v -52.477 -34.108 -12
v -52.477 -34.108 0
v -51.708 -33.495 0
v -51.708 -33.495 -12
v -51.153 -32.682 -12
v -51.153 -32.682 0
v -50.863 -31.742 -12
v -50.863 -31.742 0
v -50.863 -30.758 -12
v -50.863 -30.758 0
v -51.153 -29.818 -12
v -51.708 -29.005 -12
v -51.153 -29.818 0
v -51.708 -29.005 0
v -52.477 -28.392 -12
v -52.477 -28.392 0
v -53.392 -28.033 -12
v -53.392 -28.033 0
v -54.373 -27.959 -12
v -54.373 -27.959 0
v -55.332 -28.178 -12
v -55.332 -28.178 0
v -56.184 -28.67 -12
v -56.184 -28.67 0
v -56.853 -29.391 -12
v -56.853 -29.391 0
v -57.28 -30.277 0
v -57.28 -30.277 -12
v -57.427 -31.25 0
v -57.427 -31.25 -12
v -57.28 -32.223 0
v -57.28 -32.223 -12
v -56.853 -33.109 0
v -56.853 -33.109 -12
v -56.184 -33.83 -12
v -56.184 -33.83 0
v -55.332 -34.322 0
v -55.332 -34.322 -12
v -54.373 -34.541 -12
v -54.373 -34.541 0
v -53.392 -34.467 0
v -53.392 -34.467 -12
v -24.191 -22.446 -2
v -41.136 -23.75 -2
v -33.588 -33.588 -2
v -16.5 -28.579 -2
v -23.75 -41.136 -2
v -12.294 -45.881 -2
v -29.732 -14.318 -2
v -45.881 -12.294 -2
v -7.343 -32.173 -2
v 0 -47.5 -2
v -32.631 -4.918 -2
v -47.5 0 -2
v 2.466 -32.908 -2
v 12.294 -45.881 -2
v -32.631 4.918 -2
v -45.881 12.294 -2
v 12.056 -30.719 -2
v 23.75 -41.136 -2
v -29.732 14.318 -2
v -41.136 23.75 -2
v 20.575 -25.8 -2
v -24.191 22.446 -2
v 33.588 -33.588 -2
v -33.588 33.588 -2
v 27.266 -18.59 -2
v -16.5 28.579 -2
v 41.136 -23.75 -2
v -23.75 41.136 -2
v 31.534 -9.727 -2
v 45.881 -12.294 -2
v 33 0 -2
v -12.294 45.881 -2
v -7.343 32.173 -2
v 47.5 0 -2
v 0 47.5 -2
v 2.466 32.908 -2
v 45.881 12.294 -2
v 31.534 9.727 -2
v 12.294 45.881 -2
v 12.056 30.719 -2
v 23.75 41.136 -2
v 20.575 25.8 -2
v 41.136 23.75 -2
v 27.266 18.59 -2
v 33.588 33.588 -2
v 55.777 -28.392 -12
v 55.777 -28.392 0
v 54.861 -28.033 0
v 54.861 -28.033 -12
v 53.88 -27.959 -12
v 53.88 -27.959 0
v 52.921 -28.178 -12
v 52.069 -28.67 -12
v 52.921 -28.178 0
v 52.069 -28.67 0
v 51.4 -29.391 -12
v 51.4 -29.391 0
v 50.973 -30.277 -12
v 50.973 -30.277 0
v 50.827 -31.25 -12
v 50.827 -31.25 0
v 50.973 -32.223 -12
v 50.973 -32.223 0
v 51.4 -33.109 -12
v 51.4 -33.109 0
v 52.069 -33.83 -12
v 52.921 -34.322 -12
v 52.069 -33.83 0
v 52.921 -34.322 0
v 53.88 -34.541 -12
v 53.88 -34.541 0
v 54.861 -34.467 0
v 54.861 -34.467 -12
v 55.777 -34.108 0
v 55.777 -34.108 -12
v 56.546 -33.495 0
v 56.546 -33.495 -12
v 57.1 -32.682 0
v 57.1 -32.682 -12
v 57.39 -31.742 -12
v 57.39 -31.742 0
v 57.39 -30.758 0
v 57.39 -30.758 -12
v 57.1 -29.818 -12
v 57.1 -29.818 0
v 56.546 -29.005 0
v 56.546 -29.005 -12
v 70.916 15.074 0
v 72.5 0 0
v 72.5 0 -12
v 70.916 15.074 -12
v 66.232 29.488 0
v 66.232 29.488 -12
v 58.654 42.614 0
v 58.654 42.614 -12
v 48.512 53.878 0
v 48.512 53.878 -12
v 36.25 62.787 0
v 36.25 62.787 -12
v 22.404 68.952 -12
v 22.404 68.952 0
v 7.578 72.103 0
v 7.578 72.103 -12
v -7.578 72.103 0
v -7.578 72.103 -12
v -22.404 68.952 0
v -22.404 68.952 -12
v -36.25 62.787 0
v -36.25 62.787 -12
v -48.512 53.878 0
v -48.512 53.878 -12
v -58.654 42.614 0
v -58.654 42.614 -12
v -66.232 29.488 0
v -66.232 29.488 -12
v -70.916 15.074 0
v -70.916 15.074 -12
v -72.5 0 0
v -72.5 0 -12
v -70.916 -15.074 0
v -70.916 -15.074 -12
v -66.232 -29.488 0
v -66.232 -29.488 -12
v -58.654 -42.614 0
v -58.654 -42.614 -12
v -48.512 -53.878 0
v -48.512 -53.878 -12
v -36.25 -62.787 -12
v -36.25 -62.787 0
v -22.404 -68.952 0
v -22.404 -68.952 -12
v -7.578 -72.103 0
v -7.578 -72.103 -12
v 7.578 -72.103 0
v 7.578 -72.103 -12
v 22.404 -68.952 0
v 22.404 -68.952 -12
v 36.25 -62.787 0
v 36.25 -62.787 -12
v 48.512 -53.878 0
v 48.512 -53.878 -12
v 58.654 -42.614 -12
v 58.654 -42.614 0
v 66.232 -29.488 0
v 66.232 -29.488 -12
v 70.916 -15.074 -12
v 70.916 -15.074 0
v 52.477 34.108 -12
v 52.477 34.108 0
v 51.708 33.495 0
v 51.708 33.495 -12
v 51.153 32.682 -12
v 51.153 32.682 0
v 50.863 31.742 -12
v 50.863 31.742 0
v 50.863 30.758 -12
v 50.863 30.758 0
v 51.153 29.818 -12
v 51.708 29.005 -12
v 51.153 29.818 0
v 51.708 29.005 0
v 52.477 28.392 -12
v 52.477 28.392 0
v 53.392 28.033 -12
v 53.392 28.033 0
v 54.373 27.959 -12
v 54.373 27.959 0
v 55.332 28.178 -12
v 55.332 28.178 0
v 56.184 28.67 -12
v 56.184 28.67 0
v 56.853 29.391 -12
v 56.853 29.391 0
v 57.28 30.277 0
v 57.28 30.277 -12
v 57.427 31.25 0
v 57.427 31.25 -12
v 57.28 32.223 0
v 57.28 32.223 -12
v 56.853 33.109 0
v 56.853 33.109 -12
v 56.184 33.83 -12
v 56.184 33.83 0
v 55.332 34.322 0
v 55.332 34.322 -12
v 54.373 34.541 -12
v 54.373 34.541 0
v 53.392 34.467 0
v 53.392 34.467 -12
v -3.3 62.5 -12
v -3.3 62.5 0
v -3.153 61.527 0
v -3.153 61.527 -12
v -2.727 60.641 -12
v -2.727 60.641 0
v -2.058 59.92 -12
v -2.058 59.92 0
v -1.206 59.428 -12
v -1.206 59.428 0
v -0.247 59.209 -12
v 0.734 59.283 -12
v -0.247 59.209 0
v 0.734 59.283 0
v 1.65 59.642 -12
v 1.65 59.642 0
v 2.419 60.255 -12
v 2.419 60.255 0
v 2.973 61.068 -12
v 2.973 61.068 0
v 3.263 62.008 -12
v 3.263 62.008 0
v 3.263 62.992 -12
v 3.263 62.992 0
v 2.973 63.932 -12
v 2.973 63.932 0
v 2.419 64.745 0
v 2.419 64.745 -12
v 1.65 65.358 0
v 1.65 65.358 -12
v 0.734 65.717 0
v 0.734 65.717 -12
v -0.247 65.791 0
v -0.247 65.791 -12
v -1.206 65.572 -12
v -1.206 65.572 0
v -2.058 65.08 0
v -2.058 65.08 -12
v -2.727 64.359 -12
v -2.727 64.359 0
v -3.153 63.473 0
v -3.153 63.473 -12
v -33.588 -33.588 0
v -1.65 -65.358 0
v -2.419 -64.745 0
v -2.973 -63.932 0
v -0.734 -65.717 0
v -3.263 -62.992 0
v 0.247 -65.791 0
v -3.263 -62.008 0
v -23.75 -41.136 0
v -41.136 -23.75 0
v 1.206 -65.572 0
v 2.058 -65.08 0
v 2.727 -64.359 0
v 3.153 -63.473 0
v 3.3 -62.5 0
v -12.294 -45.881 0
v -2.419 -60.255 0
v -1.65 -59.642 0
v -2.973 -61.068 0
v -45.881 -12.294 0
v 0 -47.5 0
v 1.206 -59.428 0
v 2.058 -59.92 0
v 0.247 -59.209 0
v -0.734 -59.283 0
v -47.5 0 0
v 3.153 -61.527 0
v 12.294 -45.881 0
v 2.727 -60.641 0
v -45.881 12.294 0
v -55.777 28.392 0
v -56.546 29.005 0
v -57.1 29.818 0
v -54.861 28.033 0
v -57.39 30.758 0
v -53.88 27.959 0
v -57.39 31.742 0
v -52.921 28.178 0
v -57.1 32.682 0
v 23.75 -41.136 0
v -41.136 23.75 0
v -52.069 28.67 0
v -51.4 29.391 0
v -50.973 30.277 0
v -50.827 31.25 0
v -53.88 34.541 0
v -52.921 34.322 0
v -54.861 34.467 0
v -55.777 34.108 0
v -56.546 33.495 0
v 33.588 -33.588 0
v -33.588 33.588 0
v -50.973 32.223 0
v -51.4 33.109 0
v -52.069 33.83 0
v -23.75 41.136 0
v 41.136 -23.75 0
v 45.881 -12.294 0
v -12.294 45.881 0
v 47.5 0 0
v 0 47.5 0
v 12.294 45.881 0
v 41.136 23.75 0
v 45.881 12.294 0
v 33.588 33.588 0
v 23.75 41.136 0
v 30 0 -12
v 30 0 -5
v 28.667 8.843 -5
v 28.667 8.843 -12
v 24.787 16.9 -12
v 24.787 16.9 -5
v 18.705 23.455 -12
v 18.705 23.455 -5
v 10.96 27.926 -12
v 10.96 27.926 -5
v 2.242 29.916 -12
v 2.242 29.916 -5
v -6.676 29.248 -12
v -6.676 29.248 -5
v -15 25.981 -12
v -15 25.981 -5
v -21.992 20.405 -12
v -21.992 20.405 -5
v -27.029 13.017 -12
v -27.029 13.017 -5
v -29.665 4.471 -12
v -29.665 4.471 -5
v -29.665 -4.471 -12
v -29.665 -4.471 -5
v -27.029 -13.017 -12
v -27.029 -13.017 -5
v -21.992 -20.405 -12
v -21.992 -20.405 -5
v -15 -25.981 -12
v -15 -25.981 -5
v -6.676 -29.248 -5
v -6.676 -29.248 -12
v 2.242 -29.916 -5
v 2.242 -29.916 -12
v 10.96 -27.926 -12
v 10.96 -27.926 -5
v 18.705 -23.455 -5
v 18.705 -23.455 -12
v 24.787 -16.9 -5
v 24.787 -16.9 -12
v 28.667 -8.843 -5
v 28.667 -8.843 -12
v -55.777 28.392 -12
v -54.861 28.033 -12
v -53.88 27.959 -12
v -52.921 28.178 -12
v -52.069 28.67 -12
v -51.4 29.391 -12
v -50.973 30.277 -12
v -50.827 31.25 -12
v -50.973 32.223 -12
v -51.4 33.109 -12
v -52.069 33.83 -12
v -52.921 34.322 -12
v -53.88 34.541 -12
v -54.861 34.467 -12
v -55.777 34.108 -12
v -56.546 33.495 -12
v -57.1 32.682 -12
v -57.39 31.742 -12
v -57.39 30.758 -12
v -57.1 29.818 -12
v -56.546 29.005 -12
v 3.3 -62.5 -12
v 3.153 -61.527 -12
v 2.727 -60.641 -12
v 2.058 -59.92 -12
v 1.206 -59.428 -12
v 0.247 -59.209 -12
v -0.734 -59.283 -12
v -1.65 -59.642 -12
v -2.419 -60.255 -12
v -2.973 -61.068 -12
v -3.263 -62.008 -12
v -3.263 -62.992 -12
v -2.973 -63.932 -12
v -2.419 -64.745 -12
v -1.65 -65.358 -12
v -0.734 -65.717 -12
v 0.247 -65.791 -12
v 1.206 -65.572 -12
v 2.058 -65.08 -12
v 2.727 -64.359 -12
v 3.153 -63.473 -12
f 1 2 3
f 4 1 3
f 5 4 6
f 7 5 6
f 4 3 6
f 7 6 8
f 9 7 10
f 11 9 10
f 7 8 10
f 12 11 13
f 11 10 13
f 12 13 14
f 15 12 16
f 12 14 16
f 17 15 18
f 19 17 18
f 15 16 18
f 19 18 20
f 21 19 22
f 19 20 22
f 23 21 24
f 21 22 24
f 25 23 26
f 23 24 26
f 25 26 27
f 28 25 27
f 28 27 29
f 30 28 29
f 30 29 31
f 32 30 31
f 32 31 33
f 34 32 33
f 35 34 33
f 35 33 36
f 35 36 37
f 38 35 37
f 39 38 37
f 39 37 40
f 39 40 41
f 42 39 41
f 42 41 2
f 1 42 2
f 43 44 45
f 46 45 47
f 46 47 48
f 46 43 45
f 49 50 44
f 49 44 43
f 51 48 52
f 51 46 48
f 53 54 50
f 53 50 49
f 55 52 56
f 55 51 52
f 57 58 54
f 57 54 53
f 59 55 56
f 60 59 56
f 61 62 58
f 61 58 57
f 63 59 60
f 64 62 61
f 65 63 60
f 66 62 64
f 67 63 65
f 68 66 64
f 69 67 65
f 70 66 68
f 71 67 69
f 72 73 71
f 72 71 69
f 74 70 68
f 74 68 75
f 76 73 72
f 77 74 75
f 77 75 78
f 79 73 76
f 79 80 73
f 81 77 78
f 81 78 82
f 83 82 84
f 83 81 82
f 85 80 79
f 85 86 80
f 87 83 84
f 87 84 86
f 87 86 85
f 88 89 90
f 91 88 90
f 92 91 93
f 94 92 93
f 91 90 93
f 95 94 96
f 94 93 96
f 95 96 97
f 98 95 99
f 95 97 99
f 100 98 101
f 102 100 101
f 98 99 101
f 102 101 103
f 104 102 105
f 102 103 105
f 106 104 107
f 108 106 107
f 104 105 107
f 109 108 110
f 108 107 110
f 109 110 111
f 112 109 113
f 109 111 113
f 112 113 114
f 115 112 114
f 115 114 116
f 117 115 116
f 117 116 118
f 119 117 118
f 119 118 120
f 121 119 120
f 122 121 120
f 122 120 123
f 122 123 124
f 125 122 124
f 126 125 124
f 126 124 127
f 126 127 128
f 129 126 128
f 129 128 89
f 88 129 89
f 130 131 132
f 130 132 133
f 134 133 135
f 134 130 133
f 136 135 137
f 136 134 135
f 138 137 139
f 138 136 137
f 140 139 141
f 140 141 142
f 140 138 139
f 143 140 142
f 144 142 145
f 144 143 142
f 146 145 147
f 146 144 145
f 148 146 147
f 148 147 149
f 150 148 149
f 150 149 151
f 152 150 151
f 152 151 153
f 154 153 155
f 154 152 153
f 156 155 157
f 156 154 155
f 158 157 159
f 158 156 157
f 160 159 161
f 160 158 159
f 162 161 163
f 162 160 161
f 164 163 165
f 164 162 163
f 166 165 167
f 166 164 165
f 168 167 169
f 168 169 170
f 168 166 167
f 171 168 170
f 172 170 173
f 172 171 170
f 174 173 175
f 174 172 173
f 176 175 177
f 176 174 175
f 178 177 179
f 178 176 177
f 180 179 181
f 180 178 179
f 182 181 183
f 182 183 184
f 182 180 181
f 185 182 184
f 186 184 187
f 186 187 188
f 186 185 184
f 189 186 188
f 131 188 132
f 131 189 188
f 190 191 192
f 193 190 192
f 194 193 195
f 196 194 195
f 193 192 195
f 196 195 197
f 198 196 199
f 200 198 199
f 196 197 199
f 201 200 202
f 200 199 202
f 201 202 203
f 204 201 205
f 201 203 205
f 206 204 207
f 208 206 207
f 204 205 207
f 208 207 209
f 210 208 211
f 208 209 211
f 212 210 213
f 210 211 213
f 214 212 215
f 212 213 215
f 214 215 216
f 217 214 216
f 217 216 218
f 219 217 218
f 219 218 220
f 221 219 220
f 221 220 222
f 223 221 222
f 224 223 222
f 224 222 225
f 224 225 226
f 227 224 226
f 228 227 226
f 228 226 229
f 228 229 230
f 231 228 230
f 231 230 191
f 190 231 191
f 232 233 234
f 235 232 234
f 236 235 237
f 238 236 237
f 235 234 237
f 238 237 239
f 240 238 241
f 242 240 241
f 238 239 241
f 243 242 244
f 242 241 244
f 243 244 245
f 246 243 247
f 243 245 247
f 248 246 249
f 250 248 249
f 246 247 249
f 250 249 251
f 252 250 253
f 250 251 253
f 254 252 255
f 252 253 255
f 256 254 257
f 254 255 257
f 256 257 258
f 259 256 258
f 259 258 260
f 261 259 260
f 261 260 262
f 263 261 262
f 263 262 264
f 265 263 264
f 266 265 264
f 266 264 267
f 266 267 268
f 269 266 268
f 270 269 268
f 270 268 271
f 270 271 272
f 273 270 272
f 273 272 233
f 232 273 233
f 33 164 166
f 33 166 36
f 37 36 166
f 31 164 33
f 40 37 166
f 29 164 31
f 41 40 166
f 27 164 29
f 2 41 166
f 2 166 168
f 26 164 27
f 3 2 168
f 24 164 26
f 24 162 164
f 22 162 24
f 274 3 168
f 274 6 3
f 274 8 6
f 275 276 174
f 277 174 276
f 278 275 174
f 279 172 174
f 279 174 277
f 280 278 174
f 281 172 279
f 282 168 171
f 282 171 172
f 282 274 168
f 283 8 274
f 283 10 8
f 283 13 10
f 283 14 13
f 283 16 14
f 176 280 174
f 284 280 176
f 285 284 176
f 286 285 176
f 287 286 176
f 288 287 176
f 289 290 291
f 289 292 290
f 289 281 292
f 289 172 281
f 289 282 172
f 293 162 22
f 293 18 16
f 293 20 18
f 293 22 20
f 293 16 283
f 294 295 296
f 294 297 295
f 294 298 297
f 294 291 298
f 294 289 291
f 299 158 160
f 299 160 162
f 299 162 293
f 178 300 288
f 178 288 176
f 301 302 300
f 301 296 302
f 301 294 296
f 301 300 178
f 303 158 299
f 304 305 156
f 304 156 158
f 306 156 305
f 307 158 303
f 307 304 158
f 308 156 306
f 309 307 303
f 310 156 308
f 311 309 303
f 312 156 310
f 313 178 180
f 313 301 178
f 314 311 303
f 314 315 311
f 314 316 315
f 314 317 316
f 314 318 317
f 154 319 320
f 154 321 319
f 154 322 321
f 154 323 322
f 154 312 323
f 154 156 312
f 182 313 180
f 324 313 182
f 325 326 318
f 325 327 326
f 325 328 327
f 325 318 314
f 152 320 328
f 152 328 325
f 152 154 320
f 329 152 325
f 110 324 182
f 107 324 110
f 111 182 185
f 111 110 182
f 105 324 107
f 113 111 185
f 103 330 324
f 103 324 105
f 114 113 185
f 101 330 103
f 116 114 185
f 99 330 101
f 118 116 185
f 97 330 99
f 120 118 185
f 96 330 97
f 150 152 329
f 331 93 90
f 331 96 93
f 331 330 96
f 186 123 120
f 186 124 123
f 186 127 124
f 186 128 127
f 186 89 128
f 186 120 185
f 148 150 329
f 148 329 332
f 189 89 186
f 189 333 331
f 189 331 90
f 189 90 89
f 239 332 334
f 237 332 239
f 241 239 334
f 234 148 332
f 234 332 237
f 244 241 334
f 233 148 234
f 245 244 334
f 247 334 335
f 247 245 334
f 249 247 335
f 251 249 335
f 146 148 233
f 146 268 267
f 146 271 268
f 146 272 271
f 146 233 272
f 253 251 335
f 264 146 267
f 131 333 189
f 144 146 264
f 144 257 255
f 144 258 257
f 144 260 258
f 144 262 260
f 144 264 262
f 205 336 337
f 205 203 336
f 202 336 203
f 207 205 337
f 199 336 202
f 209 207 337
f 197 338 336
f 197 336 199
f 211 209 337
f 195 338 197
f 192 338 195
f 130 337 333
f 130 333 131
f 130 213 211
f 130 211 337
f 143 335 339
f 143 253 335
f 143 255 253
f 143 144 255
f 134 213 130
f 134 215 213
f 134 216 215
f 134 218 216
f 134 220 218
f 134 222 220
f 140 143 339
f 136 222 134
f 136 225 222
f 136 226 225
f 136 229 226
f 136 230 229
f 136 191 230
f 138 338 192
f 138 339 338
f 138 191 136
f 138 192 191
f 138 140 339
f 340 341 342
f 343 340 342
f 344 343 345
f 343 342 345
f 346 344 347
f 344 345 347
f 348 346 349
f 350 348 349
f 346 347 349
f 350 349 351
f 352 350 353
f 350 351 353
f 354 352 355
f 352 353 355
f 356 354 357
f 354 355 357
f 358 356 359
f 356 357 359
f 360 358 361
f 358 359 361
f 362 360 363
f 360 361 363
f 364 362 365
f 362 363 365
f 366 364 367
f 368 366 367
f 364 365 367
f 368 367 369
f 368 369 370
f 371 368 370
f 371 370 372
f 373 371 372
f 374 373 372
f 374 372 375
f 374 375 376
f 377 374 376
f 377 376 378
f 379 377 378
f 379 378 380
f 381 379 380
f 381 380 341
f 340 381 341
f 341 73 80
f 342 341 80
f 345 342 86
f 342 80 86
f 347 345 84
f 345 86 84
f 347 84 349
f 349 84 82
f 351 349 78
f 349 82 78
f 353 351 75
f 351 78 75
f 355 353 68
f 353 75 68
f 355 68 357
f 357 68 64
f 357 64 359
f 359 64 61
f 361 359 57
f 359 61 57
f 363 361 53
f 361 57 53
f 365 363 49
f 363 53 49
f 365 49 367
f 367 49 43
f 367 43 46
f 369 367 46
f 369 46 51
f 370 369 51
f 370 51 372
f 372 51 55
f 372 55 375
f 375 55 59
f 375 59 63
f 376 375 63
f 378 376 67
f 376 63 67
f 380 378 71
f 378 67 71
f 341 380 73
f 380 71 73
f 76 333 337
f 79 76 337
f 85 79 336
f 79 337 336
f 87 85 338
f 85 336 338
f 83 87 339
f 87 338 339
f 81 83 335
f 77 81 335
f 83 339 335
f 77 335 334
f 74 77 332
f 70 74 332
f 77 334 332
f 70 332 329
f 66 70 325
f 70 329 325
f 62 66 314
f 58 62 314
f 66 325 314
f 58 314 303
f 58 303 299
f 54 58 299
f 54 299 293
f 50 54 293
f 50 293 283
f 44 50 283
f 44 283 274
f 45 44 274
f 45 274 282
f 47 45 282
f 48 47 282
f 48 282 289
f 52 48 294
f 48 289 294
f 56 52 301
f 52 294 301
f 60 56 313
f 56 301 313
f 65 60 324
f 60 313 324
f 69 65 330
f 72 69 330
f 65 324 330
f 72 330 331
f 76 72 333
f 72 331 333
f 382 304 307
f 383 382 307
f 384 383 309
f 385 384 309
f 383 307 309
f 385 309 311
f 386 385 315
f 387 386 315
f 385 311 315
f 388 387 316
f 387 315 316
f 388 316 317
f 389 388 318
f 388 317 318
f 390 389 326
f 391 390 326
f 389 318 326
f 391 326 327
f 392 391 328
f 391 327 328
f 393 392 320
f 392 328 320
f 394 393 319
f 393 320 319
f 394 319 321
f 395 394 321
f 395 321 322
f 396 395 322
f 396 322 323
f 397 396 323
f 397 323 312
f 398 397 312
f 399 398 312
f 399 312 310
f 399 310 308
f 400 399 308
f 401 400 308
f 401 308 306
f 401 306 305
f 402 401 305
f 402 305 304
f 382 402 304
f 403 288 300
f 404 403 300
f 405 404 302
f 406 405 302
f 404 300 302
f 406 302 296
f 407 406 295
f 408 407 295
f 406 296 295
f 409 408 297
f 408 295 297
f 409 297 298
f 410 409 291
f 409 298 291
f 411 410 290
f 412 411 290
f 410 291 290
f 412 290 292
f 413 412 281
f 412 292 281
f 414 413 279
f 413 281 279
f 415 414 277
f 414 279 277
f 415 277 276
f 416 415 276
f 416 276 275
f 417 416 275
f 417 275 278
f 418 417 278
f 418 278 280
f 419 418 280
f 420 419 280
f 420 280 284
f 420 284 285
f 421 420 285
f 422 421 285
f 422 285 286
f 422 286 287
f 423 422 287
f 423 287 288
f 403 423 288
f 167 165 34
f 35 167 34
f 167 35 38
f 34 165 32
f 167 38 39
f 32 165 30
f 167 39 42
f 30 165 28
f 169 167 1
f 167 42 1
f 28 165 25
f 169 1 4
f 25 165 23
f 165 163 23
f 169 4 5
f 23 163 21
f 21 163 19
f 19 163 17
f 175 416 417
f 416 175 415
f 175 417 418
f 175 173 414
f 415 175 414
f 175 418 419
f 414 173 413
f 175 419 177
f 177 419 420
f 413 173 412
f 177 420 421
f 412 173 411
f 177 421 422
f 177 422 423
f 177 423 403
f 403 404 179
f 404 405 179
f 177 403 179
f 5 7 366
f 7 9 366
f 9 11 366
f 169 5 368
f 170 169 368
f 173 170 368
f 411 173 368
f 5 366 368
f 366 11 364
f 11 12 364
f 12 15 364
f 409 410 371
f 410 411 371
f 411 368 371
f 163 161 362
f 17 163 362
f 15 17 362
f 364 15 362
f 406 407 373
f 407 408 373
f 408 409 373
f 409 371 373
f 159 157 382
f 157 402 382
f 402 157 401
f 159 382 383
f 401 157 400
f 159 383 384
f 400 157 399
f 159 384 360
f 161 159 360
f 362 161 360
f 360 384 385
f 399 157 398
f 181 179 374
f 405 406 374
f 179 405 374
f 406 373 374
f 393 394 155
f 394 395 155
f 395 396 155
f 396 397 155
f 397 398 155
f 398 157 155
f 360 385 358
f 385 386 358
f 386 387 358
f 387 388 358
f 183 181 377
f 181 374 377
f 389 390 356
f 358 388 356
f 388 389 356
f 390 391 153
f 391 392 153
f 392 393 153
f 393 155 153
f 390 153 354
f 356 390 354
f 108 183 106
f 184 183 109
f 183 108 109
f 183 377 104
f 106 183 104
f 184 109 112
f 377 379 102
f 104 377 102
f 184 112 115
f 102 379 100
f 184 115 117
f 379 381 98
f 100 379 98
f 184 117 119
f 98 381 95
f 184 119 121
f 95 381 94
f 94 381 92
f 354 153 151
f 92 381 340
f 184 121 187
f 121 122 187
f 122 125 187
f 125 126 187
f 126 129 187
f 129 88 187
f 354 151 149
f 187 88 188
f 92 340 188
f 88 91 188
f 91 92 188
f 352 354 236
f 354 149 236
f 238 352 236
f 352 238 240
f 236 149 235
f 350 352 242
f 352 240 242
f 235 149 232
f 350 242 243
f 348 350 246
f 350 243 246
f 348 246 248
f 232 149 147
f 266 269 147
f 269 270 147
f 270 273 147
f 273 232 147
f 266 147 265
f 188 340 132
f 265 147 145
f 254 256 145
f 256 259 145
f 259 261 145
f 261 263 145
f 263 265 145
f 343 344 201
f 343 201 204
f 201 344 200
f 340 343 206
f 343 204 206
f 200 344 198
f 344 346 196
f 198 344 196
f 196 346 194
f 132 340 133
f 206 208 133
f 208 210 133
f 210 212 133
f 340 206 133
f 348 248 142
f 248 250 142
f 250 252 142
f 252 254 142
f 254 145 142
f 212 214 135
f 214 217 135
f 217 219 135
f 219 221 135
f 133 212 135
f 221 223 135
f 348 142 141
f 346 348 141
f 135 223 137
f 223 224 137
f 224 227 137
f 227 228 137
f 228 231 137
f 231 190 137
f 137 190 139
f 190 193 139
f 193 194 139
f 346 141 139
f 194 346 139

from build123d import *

# Parameters (mm, degrees)
SKETCH1_R            = 72.5
SKETCH1_R_2          = 30
BOSS_EXTRUDE1_DEPTH  = 12
M6_CLEARANCE_HOLE1_D = 6.6
CIRPATTERN1_COUNT    = 6
SKETCH4_R            = 47.5
CUT_EXTRUDE1_DEPTH   = 2
CHAMFER1_SIZE        = 3


with BuildPart() as part:
    # Sketch1 → Boss-Extrude1 (new body)
    with BuildSketch(Plane.XY):
        Circle(SKETCH1_R)
        Circle(SKETCH1_R_2, mode=Mode.SUBTRACT)
    extrude(amount=-BOSS_EXTRUDE1_DEPTH)

    # M6 Clearance Hole1 (through all)
    with Locations(Plane(origin=(9.54608016, 92.530972723, -12), x_dir=(1, 0, 0), z_dir=(0, 0, -1))):
        with Locations((-9.54608016, 30.030972723)):
            m6_clearance_hole1 = Hole(M6_CLEARANCE_HOLE1_D / 2)

    # CirPattern1: M6 Clearance Hole1 ×6 about axis
    cirpattern1_axis = Axis((0, 0, 0), (0, 0, 1))
    for i in range(1, CIRPATTERN1_COUNT):
        add(m6_clearance_hole1.rotate(cirpattern1_axis, i * 360 / CIRPATTERN1_COUNT), mode=Mode.SUBTRACT)

    # Sketch4 → Cut-Extrude1 (cut)
    with BuildSketch(Plane.XY):
        Circle(SKETCH4_R)
    extrude(amount=-CUT_EXTRUDE1_DEPTH, mode=Mode.SUBTRACT)

    # Chamfer1
    chamfer1_edges = [part.edges().sort_by_distance(p)[0] for p in [
        (-30, 0, -2),
    ]]
    chamfer(chamfer1_edges, length=CHAMFER1_SIZE)


solid = part.part
